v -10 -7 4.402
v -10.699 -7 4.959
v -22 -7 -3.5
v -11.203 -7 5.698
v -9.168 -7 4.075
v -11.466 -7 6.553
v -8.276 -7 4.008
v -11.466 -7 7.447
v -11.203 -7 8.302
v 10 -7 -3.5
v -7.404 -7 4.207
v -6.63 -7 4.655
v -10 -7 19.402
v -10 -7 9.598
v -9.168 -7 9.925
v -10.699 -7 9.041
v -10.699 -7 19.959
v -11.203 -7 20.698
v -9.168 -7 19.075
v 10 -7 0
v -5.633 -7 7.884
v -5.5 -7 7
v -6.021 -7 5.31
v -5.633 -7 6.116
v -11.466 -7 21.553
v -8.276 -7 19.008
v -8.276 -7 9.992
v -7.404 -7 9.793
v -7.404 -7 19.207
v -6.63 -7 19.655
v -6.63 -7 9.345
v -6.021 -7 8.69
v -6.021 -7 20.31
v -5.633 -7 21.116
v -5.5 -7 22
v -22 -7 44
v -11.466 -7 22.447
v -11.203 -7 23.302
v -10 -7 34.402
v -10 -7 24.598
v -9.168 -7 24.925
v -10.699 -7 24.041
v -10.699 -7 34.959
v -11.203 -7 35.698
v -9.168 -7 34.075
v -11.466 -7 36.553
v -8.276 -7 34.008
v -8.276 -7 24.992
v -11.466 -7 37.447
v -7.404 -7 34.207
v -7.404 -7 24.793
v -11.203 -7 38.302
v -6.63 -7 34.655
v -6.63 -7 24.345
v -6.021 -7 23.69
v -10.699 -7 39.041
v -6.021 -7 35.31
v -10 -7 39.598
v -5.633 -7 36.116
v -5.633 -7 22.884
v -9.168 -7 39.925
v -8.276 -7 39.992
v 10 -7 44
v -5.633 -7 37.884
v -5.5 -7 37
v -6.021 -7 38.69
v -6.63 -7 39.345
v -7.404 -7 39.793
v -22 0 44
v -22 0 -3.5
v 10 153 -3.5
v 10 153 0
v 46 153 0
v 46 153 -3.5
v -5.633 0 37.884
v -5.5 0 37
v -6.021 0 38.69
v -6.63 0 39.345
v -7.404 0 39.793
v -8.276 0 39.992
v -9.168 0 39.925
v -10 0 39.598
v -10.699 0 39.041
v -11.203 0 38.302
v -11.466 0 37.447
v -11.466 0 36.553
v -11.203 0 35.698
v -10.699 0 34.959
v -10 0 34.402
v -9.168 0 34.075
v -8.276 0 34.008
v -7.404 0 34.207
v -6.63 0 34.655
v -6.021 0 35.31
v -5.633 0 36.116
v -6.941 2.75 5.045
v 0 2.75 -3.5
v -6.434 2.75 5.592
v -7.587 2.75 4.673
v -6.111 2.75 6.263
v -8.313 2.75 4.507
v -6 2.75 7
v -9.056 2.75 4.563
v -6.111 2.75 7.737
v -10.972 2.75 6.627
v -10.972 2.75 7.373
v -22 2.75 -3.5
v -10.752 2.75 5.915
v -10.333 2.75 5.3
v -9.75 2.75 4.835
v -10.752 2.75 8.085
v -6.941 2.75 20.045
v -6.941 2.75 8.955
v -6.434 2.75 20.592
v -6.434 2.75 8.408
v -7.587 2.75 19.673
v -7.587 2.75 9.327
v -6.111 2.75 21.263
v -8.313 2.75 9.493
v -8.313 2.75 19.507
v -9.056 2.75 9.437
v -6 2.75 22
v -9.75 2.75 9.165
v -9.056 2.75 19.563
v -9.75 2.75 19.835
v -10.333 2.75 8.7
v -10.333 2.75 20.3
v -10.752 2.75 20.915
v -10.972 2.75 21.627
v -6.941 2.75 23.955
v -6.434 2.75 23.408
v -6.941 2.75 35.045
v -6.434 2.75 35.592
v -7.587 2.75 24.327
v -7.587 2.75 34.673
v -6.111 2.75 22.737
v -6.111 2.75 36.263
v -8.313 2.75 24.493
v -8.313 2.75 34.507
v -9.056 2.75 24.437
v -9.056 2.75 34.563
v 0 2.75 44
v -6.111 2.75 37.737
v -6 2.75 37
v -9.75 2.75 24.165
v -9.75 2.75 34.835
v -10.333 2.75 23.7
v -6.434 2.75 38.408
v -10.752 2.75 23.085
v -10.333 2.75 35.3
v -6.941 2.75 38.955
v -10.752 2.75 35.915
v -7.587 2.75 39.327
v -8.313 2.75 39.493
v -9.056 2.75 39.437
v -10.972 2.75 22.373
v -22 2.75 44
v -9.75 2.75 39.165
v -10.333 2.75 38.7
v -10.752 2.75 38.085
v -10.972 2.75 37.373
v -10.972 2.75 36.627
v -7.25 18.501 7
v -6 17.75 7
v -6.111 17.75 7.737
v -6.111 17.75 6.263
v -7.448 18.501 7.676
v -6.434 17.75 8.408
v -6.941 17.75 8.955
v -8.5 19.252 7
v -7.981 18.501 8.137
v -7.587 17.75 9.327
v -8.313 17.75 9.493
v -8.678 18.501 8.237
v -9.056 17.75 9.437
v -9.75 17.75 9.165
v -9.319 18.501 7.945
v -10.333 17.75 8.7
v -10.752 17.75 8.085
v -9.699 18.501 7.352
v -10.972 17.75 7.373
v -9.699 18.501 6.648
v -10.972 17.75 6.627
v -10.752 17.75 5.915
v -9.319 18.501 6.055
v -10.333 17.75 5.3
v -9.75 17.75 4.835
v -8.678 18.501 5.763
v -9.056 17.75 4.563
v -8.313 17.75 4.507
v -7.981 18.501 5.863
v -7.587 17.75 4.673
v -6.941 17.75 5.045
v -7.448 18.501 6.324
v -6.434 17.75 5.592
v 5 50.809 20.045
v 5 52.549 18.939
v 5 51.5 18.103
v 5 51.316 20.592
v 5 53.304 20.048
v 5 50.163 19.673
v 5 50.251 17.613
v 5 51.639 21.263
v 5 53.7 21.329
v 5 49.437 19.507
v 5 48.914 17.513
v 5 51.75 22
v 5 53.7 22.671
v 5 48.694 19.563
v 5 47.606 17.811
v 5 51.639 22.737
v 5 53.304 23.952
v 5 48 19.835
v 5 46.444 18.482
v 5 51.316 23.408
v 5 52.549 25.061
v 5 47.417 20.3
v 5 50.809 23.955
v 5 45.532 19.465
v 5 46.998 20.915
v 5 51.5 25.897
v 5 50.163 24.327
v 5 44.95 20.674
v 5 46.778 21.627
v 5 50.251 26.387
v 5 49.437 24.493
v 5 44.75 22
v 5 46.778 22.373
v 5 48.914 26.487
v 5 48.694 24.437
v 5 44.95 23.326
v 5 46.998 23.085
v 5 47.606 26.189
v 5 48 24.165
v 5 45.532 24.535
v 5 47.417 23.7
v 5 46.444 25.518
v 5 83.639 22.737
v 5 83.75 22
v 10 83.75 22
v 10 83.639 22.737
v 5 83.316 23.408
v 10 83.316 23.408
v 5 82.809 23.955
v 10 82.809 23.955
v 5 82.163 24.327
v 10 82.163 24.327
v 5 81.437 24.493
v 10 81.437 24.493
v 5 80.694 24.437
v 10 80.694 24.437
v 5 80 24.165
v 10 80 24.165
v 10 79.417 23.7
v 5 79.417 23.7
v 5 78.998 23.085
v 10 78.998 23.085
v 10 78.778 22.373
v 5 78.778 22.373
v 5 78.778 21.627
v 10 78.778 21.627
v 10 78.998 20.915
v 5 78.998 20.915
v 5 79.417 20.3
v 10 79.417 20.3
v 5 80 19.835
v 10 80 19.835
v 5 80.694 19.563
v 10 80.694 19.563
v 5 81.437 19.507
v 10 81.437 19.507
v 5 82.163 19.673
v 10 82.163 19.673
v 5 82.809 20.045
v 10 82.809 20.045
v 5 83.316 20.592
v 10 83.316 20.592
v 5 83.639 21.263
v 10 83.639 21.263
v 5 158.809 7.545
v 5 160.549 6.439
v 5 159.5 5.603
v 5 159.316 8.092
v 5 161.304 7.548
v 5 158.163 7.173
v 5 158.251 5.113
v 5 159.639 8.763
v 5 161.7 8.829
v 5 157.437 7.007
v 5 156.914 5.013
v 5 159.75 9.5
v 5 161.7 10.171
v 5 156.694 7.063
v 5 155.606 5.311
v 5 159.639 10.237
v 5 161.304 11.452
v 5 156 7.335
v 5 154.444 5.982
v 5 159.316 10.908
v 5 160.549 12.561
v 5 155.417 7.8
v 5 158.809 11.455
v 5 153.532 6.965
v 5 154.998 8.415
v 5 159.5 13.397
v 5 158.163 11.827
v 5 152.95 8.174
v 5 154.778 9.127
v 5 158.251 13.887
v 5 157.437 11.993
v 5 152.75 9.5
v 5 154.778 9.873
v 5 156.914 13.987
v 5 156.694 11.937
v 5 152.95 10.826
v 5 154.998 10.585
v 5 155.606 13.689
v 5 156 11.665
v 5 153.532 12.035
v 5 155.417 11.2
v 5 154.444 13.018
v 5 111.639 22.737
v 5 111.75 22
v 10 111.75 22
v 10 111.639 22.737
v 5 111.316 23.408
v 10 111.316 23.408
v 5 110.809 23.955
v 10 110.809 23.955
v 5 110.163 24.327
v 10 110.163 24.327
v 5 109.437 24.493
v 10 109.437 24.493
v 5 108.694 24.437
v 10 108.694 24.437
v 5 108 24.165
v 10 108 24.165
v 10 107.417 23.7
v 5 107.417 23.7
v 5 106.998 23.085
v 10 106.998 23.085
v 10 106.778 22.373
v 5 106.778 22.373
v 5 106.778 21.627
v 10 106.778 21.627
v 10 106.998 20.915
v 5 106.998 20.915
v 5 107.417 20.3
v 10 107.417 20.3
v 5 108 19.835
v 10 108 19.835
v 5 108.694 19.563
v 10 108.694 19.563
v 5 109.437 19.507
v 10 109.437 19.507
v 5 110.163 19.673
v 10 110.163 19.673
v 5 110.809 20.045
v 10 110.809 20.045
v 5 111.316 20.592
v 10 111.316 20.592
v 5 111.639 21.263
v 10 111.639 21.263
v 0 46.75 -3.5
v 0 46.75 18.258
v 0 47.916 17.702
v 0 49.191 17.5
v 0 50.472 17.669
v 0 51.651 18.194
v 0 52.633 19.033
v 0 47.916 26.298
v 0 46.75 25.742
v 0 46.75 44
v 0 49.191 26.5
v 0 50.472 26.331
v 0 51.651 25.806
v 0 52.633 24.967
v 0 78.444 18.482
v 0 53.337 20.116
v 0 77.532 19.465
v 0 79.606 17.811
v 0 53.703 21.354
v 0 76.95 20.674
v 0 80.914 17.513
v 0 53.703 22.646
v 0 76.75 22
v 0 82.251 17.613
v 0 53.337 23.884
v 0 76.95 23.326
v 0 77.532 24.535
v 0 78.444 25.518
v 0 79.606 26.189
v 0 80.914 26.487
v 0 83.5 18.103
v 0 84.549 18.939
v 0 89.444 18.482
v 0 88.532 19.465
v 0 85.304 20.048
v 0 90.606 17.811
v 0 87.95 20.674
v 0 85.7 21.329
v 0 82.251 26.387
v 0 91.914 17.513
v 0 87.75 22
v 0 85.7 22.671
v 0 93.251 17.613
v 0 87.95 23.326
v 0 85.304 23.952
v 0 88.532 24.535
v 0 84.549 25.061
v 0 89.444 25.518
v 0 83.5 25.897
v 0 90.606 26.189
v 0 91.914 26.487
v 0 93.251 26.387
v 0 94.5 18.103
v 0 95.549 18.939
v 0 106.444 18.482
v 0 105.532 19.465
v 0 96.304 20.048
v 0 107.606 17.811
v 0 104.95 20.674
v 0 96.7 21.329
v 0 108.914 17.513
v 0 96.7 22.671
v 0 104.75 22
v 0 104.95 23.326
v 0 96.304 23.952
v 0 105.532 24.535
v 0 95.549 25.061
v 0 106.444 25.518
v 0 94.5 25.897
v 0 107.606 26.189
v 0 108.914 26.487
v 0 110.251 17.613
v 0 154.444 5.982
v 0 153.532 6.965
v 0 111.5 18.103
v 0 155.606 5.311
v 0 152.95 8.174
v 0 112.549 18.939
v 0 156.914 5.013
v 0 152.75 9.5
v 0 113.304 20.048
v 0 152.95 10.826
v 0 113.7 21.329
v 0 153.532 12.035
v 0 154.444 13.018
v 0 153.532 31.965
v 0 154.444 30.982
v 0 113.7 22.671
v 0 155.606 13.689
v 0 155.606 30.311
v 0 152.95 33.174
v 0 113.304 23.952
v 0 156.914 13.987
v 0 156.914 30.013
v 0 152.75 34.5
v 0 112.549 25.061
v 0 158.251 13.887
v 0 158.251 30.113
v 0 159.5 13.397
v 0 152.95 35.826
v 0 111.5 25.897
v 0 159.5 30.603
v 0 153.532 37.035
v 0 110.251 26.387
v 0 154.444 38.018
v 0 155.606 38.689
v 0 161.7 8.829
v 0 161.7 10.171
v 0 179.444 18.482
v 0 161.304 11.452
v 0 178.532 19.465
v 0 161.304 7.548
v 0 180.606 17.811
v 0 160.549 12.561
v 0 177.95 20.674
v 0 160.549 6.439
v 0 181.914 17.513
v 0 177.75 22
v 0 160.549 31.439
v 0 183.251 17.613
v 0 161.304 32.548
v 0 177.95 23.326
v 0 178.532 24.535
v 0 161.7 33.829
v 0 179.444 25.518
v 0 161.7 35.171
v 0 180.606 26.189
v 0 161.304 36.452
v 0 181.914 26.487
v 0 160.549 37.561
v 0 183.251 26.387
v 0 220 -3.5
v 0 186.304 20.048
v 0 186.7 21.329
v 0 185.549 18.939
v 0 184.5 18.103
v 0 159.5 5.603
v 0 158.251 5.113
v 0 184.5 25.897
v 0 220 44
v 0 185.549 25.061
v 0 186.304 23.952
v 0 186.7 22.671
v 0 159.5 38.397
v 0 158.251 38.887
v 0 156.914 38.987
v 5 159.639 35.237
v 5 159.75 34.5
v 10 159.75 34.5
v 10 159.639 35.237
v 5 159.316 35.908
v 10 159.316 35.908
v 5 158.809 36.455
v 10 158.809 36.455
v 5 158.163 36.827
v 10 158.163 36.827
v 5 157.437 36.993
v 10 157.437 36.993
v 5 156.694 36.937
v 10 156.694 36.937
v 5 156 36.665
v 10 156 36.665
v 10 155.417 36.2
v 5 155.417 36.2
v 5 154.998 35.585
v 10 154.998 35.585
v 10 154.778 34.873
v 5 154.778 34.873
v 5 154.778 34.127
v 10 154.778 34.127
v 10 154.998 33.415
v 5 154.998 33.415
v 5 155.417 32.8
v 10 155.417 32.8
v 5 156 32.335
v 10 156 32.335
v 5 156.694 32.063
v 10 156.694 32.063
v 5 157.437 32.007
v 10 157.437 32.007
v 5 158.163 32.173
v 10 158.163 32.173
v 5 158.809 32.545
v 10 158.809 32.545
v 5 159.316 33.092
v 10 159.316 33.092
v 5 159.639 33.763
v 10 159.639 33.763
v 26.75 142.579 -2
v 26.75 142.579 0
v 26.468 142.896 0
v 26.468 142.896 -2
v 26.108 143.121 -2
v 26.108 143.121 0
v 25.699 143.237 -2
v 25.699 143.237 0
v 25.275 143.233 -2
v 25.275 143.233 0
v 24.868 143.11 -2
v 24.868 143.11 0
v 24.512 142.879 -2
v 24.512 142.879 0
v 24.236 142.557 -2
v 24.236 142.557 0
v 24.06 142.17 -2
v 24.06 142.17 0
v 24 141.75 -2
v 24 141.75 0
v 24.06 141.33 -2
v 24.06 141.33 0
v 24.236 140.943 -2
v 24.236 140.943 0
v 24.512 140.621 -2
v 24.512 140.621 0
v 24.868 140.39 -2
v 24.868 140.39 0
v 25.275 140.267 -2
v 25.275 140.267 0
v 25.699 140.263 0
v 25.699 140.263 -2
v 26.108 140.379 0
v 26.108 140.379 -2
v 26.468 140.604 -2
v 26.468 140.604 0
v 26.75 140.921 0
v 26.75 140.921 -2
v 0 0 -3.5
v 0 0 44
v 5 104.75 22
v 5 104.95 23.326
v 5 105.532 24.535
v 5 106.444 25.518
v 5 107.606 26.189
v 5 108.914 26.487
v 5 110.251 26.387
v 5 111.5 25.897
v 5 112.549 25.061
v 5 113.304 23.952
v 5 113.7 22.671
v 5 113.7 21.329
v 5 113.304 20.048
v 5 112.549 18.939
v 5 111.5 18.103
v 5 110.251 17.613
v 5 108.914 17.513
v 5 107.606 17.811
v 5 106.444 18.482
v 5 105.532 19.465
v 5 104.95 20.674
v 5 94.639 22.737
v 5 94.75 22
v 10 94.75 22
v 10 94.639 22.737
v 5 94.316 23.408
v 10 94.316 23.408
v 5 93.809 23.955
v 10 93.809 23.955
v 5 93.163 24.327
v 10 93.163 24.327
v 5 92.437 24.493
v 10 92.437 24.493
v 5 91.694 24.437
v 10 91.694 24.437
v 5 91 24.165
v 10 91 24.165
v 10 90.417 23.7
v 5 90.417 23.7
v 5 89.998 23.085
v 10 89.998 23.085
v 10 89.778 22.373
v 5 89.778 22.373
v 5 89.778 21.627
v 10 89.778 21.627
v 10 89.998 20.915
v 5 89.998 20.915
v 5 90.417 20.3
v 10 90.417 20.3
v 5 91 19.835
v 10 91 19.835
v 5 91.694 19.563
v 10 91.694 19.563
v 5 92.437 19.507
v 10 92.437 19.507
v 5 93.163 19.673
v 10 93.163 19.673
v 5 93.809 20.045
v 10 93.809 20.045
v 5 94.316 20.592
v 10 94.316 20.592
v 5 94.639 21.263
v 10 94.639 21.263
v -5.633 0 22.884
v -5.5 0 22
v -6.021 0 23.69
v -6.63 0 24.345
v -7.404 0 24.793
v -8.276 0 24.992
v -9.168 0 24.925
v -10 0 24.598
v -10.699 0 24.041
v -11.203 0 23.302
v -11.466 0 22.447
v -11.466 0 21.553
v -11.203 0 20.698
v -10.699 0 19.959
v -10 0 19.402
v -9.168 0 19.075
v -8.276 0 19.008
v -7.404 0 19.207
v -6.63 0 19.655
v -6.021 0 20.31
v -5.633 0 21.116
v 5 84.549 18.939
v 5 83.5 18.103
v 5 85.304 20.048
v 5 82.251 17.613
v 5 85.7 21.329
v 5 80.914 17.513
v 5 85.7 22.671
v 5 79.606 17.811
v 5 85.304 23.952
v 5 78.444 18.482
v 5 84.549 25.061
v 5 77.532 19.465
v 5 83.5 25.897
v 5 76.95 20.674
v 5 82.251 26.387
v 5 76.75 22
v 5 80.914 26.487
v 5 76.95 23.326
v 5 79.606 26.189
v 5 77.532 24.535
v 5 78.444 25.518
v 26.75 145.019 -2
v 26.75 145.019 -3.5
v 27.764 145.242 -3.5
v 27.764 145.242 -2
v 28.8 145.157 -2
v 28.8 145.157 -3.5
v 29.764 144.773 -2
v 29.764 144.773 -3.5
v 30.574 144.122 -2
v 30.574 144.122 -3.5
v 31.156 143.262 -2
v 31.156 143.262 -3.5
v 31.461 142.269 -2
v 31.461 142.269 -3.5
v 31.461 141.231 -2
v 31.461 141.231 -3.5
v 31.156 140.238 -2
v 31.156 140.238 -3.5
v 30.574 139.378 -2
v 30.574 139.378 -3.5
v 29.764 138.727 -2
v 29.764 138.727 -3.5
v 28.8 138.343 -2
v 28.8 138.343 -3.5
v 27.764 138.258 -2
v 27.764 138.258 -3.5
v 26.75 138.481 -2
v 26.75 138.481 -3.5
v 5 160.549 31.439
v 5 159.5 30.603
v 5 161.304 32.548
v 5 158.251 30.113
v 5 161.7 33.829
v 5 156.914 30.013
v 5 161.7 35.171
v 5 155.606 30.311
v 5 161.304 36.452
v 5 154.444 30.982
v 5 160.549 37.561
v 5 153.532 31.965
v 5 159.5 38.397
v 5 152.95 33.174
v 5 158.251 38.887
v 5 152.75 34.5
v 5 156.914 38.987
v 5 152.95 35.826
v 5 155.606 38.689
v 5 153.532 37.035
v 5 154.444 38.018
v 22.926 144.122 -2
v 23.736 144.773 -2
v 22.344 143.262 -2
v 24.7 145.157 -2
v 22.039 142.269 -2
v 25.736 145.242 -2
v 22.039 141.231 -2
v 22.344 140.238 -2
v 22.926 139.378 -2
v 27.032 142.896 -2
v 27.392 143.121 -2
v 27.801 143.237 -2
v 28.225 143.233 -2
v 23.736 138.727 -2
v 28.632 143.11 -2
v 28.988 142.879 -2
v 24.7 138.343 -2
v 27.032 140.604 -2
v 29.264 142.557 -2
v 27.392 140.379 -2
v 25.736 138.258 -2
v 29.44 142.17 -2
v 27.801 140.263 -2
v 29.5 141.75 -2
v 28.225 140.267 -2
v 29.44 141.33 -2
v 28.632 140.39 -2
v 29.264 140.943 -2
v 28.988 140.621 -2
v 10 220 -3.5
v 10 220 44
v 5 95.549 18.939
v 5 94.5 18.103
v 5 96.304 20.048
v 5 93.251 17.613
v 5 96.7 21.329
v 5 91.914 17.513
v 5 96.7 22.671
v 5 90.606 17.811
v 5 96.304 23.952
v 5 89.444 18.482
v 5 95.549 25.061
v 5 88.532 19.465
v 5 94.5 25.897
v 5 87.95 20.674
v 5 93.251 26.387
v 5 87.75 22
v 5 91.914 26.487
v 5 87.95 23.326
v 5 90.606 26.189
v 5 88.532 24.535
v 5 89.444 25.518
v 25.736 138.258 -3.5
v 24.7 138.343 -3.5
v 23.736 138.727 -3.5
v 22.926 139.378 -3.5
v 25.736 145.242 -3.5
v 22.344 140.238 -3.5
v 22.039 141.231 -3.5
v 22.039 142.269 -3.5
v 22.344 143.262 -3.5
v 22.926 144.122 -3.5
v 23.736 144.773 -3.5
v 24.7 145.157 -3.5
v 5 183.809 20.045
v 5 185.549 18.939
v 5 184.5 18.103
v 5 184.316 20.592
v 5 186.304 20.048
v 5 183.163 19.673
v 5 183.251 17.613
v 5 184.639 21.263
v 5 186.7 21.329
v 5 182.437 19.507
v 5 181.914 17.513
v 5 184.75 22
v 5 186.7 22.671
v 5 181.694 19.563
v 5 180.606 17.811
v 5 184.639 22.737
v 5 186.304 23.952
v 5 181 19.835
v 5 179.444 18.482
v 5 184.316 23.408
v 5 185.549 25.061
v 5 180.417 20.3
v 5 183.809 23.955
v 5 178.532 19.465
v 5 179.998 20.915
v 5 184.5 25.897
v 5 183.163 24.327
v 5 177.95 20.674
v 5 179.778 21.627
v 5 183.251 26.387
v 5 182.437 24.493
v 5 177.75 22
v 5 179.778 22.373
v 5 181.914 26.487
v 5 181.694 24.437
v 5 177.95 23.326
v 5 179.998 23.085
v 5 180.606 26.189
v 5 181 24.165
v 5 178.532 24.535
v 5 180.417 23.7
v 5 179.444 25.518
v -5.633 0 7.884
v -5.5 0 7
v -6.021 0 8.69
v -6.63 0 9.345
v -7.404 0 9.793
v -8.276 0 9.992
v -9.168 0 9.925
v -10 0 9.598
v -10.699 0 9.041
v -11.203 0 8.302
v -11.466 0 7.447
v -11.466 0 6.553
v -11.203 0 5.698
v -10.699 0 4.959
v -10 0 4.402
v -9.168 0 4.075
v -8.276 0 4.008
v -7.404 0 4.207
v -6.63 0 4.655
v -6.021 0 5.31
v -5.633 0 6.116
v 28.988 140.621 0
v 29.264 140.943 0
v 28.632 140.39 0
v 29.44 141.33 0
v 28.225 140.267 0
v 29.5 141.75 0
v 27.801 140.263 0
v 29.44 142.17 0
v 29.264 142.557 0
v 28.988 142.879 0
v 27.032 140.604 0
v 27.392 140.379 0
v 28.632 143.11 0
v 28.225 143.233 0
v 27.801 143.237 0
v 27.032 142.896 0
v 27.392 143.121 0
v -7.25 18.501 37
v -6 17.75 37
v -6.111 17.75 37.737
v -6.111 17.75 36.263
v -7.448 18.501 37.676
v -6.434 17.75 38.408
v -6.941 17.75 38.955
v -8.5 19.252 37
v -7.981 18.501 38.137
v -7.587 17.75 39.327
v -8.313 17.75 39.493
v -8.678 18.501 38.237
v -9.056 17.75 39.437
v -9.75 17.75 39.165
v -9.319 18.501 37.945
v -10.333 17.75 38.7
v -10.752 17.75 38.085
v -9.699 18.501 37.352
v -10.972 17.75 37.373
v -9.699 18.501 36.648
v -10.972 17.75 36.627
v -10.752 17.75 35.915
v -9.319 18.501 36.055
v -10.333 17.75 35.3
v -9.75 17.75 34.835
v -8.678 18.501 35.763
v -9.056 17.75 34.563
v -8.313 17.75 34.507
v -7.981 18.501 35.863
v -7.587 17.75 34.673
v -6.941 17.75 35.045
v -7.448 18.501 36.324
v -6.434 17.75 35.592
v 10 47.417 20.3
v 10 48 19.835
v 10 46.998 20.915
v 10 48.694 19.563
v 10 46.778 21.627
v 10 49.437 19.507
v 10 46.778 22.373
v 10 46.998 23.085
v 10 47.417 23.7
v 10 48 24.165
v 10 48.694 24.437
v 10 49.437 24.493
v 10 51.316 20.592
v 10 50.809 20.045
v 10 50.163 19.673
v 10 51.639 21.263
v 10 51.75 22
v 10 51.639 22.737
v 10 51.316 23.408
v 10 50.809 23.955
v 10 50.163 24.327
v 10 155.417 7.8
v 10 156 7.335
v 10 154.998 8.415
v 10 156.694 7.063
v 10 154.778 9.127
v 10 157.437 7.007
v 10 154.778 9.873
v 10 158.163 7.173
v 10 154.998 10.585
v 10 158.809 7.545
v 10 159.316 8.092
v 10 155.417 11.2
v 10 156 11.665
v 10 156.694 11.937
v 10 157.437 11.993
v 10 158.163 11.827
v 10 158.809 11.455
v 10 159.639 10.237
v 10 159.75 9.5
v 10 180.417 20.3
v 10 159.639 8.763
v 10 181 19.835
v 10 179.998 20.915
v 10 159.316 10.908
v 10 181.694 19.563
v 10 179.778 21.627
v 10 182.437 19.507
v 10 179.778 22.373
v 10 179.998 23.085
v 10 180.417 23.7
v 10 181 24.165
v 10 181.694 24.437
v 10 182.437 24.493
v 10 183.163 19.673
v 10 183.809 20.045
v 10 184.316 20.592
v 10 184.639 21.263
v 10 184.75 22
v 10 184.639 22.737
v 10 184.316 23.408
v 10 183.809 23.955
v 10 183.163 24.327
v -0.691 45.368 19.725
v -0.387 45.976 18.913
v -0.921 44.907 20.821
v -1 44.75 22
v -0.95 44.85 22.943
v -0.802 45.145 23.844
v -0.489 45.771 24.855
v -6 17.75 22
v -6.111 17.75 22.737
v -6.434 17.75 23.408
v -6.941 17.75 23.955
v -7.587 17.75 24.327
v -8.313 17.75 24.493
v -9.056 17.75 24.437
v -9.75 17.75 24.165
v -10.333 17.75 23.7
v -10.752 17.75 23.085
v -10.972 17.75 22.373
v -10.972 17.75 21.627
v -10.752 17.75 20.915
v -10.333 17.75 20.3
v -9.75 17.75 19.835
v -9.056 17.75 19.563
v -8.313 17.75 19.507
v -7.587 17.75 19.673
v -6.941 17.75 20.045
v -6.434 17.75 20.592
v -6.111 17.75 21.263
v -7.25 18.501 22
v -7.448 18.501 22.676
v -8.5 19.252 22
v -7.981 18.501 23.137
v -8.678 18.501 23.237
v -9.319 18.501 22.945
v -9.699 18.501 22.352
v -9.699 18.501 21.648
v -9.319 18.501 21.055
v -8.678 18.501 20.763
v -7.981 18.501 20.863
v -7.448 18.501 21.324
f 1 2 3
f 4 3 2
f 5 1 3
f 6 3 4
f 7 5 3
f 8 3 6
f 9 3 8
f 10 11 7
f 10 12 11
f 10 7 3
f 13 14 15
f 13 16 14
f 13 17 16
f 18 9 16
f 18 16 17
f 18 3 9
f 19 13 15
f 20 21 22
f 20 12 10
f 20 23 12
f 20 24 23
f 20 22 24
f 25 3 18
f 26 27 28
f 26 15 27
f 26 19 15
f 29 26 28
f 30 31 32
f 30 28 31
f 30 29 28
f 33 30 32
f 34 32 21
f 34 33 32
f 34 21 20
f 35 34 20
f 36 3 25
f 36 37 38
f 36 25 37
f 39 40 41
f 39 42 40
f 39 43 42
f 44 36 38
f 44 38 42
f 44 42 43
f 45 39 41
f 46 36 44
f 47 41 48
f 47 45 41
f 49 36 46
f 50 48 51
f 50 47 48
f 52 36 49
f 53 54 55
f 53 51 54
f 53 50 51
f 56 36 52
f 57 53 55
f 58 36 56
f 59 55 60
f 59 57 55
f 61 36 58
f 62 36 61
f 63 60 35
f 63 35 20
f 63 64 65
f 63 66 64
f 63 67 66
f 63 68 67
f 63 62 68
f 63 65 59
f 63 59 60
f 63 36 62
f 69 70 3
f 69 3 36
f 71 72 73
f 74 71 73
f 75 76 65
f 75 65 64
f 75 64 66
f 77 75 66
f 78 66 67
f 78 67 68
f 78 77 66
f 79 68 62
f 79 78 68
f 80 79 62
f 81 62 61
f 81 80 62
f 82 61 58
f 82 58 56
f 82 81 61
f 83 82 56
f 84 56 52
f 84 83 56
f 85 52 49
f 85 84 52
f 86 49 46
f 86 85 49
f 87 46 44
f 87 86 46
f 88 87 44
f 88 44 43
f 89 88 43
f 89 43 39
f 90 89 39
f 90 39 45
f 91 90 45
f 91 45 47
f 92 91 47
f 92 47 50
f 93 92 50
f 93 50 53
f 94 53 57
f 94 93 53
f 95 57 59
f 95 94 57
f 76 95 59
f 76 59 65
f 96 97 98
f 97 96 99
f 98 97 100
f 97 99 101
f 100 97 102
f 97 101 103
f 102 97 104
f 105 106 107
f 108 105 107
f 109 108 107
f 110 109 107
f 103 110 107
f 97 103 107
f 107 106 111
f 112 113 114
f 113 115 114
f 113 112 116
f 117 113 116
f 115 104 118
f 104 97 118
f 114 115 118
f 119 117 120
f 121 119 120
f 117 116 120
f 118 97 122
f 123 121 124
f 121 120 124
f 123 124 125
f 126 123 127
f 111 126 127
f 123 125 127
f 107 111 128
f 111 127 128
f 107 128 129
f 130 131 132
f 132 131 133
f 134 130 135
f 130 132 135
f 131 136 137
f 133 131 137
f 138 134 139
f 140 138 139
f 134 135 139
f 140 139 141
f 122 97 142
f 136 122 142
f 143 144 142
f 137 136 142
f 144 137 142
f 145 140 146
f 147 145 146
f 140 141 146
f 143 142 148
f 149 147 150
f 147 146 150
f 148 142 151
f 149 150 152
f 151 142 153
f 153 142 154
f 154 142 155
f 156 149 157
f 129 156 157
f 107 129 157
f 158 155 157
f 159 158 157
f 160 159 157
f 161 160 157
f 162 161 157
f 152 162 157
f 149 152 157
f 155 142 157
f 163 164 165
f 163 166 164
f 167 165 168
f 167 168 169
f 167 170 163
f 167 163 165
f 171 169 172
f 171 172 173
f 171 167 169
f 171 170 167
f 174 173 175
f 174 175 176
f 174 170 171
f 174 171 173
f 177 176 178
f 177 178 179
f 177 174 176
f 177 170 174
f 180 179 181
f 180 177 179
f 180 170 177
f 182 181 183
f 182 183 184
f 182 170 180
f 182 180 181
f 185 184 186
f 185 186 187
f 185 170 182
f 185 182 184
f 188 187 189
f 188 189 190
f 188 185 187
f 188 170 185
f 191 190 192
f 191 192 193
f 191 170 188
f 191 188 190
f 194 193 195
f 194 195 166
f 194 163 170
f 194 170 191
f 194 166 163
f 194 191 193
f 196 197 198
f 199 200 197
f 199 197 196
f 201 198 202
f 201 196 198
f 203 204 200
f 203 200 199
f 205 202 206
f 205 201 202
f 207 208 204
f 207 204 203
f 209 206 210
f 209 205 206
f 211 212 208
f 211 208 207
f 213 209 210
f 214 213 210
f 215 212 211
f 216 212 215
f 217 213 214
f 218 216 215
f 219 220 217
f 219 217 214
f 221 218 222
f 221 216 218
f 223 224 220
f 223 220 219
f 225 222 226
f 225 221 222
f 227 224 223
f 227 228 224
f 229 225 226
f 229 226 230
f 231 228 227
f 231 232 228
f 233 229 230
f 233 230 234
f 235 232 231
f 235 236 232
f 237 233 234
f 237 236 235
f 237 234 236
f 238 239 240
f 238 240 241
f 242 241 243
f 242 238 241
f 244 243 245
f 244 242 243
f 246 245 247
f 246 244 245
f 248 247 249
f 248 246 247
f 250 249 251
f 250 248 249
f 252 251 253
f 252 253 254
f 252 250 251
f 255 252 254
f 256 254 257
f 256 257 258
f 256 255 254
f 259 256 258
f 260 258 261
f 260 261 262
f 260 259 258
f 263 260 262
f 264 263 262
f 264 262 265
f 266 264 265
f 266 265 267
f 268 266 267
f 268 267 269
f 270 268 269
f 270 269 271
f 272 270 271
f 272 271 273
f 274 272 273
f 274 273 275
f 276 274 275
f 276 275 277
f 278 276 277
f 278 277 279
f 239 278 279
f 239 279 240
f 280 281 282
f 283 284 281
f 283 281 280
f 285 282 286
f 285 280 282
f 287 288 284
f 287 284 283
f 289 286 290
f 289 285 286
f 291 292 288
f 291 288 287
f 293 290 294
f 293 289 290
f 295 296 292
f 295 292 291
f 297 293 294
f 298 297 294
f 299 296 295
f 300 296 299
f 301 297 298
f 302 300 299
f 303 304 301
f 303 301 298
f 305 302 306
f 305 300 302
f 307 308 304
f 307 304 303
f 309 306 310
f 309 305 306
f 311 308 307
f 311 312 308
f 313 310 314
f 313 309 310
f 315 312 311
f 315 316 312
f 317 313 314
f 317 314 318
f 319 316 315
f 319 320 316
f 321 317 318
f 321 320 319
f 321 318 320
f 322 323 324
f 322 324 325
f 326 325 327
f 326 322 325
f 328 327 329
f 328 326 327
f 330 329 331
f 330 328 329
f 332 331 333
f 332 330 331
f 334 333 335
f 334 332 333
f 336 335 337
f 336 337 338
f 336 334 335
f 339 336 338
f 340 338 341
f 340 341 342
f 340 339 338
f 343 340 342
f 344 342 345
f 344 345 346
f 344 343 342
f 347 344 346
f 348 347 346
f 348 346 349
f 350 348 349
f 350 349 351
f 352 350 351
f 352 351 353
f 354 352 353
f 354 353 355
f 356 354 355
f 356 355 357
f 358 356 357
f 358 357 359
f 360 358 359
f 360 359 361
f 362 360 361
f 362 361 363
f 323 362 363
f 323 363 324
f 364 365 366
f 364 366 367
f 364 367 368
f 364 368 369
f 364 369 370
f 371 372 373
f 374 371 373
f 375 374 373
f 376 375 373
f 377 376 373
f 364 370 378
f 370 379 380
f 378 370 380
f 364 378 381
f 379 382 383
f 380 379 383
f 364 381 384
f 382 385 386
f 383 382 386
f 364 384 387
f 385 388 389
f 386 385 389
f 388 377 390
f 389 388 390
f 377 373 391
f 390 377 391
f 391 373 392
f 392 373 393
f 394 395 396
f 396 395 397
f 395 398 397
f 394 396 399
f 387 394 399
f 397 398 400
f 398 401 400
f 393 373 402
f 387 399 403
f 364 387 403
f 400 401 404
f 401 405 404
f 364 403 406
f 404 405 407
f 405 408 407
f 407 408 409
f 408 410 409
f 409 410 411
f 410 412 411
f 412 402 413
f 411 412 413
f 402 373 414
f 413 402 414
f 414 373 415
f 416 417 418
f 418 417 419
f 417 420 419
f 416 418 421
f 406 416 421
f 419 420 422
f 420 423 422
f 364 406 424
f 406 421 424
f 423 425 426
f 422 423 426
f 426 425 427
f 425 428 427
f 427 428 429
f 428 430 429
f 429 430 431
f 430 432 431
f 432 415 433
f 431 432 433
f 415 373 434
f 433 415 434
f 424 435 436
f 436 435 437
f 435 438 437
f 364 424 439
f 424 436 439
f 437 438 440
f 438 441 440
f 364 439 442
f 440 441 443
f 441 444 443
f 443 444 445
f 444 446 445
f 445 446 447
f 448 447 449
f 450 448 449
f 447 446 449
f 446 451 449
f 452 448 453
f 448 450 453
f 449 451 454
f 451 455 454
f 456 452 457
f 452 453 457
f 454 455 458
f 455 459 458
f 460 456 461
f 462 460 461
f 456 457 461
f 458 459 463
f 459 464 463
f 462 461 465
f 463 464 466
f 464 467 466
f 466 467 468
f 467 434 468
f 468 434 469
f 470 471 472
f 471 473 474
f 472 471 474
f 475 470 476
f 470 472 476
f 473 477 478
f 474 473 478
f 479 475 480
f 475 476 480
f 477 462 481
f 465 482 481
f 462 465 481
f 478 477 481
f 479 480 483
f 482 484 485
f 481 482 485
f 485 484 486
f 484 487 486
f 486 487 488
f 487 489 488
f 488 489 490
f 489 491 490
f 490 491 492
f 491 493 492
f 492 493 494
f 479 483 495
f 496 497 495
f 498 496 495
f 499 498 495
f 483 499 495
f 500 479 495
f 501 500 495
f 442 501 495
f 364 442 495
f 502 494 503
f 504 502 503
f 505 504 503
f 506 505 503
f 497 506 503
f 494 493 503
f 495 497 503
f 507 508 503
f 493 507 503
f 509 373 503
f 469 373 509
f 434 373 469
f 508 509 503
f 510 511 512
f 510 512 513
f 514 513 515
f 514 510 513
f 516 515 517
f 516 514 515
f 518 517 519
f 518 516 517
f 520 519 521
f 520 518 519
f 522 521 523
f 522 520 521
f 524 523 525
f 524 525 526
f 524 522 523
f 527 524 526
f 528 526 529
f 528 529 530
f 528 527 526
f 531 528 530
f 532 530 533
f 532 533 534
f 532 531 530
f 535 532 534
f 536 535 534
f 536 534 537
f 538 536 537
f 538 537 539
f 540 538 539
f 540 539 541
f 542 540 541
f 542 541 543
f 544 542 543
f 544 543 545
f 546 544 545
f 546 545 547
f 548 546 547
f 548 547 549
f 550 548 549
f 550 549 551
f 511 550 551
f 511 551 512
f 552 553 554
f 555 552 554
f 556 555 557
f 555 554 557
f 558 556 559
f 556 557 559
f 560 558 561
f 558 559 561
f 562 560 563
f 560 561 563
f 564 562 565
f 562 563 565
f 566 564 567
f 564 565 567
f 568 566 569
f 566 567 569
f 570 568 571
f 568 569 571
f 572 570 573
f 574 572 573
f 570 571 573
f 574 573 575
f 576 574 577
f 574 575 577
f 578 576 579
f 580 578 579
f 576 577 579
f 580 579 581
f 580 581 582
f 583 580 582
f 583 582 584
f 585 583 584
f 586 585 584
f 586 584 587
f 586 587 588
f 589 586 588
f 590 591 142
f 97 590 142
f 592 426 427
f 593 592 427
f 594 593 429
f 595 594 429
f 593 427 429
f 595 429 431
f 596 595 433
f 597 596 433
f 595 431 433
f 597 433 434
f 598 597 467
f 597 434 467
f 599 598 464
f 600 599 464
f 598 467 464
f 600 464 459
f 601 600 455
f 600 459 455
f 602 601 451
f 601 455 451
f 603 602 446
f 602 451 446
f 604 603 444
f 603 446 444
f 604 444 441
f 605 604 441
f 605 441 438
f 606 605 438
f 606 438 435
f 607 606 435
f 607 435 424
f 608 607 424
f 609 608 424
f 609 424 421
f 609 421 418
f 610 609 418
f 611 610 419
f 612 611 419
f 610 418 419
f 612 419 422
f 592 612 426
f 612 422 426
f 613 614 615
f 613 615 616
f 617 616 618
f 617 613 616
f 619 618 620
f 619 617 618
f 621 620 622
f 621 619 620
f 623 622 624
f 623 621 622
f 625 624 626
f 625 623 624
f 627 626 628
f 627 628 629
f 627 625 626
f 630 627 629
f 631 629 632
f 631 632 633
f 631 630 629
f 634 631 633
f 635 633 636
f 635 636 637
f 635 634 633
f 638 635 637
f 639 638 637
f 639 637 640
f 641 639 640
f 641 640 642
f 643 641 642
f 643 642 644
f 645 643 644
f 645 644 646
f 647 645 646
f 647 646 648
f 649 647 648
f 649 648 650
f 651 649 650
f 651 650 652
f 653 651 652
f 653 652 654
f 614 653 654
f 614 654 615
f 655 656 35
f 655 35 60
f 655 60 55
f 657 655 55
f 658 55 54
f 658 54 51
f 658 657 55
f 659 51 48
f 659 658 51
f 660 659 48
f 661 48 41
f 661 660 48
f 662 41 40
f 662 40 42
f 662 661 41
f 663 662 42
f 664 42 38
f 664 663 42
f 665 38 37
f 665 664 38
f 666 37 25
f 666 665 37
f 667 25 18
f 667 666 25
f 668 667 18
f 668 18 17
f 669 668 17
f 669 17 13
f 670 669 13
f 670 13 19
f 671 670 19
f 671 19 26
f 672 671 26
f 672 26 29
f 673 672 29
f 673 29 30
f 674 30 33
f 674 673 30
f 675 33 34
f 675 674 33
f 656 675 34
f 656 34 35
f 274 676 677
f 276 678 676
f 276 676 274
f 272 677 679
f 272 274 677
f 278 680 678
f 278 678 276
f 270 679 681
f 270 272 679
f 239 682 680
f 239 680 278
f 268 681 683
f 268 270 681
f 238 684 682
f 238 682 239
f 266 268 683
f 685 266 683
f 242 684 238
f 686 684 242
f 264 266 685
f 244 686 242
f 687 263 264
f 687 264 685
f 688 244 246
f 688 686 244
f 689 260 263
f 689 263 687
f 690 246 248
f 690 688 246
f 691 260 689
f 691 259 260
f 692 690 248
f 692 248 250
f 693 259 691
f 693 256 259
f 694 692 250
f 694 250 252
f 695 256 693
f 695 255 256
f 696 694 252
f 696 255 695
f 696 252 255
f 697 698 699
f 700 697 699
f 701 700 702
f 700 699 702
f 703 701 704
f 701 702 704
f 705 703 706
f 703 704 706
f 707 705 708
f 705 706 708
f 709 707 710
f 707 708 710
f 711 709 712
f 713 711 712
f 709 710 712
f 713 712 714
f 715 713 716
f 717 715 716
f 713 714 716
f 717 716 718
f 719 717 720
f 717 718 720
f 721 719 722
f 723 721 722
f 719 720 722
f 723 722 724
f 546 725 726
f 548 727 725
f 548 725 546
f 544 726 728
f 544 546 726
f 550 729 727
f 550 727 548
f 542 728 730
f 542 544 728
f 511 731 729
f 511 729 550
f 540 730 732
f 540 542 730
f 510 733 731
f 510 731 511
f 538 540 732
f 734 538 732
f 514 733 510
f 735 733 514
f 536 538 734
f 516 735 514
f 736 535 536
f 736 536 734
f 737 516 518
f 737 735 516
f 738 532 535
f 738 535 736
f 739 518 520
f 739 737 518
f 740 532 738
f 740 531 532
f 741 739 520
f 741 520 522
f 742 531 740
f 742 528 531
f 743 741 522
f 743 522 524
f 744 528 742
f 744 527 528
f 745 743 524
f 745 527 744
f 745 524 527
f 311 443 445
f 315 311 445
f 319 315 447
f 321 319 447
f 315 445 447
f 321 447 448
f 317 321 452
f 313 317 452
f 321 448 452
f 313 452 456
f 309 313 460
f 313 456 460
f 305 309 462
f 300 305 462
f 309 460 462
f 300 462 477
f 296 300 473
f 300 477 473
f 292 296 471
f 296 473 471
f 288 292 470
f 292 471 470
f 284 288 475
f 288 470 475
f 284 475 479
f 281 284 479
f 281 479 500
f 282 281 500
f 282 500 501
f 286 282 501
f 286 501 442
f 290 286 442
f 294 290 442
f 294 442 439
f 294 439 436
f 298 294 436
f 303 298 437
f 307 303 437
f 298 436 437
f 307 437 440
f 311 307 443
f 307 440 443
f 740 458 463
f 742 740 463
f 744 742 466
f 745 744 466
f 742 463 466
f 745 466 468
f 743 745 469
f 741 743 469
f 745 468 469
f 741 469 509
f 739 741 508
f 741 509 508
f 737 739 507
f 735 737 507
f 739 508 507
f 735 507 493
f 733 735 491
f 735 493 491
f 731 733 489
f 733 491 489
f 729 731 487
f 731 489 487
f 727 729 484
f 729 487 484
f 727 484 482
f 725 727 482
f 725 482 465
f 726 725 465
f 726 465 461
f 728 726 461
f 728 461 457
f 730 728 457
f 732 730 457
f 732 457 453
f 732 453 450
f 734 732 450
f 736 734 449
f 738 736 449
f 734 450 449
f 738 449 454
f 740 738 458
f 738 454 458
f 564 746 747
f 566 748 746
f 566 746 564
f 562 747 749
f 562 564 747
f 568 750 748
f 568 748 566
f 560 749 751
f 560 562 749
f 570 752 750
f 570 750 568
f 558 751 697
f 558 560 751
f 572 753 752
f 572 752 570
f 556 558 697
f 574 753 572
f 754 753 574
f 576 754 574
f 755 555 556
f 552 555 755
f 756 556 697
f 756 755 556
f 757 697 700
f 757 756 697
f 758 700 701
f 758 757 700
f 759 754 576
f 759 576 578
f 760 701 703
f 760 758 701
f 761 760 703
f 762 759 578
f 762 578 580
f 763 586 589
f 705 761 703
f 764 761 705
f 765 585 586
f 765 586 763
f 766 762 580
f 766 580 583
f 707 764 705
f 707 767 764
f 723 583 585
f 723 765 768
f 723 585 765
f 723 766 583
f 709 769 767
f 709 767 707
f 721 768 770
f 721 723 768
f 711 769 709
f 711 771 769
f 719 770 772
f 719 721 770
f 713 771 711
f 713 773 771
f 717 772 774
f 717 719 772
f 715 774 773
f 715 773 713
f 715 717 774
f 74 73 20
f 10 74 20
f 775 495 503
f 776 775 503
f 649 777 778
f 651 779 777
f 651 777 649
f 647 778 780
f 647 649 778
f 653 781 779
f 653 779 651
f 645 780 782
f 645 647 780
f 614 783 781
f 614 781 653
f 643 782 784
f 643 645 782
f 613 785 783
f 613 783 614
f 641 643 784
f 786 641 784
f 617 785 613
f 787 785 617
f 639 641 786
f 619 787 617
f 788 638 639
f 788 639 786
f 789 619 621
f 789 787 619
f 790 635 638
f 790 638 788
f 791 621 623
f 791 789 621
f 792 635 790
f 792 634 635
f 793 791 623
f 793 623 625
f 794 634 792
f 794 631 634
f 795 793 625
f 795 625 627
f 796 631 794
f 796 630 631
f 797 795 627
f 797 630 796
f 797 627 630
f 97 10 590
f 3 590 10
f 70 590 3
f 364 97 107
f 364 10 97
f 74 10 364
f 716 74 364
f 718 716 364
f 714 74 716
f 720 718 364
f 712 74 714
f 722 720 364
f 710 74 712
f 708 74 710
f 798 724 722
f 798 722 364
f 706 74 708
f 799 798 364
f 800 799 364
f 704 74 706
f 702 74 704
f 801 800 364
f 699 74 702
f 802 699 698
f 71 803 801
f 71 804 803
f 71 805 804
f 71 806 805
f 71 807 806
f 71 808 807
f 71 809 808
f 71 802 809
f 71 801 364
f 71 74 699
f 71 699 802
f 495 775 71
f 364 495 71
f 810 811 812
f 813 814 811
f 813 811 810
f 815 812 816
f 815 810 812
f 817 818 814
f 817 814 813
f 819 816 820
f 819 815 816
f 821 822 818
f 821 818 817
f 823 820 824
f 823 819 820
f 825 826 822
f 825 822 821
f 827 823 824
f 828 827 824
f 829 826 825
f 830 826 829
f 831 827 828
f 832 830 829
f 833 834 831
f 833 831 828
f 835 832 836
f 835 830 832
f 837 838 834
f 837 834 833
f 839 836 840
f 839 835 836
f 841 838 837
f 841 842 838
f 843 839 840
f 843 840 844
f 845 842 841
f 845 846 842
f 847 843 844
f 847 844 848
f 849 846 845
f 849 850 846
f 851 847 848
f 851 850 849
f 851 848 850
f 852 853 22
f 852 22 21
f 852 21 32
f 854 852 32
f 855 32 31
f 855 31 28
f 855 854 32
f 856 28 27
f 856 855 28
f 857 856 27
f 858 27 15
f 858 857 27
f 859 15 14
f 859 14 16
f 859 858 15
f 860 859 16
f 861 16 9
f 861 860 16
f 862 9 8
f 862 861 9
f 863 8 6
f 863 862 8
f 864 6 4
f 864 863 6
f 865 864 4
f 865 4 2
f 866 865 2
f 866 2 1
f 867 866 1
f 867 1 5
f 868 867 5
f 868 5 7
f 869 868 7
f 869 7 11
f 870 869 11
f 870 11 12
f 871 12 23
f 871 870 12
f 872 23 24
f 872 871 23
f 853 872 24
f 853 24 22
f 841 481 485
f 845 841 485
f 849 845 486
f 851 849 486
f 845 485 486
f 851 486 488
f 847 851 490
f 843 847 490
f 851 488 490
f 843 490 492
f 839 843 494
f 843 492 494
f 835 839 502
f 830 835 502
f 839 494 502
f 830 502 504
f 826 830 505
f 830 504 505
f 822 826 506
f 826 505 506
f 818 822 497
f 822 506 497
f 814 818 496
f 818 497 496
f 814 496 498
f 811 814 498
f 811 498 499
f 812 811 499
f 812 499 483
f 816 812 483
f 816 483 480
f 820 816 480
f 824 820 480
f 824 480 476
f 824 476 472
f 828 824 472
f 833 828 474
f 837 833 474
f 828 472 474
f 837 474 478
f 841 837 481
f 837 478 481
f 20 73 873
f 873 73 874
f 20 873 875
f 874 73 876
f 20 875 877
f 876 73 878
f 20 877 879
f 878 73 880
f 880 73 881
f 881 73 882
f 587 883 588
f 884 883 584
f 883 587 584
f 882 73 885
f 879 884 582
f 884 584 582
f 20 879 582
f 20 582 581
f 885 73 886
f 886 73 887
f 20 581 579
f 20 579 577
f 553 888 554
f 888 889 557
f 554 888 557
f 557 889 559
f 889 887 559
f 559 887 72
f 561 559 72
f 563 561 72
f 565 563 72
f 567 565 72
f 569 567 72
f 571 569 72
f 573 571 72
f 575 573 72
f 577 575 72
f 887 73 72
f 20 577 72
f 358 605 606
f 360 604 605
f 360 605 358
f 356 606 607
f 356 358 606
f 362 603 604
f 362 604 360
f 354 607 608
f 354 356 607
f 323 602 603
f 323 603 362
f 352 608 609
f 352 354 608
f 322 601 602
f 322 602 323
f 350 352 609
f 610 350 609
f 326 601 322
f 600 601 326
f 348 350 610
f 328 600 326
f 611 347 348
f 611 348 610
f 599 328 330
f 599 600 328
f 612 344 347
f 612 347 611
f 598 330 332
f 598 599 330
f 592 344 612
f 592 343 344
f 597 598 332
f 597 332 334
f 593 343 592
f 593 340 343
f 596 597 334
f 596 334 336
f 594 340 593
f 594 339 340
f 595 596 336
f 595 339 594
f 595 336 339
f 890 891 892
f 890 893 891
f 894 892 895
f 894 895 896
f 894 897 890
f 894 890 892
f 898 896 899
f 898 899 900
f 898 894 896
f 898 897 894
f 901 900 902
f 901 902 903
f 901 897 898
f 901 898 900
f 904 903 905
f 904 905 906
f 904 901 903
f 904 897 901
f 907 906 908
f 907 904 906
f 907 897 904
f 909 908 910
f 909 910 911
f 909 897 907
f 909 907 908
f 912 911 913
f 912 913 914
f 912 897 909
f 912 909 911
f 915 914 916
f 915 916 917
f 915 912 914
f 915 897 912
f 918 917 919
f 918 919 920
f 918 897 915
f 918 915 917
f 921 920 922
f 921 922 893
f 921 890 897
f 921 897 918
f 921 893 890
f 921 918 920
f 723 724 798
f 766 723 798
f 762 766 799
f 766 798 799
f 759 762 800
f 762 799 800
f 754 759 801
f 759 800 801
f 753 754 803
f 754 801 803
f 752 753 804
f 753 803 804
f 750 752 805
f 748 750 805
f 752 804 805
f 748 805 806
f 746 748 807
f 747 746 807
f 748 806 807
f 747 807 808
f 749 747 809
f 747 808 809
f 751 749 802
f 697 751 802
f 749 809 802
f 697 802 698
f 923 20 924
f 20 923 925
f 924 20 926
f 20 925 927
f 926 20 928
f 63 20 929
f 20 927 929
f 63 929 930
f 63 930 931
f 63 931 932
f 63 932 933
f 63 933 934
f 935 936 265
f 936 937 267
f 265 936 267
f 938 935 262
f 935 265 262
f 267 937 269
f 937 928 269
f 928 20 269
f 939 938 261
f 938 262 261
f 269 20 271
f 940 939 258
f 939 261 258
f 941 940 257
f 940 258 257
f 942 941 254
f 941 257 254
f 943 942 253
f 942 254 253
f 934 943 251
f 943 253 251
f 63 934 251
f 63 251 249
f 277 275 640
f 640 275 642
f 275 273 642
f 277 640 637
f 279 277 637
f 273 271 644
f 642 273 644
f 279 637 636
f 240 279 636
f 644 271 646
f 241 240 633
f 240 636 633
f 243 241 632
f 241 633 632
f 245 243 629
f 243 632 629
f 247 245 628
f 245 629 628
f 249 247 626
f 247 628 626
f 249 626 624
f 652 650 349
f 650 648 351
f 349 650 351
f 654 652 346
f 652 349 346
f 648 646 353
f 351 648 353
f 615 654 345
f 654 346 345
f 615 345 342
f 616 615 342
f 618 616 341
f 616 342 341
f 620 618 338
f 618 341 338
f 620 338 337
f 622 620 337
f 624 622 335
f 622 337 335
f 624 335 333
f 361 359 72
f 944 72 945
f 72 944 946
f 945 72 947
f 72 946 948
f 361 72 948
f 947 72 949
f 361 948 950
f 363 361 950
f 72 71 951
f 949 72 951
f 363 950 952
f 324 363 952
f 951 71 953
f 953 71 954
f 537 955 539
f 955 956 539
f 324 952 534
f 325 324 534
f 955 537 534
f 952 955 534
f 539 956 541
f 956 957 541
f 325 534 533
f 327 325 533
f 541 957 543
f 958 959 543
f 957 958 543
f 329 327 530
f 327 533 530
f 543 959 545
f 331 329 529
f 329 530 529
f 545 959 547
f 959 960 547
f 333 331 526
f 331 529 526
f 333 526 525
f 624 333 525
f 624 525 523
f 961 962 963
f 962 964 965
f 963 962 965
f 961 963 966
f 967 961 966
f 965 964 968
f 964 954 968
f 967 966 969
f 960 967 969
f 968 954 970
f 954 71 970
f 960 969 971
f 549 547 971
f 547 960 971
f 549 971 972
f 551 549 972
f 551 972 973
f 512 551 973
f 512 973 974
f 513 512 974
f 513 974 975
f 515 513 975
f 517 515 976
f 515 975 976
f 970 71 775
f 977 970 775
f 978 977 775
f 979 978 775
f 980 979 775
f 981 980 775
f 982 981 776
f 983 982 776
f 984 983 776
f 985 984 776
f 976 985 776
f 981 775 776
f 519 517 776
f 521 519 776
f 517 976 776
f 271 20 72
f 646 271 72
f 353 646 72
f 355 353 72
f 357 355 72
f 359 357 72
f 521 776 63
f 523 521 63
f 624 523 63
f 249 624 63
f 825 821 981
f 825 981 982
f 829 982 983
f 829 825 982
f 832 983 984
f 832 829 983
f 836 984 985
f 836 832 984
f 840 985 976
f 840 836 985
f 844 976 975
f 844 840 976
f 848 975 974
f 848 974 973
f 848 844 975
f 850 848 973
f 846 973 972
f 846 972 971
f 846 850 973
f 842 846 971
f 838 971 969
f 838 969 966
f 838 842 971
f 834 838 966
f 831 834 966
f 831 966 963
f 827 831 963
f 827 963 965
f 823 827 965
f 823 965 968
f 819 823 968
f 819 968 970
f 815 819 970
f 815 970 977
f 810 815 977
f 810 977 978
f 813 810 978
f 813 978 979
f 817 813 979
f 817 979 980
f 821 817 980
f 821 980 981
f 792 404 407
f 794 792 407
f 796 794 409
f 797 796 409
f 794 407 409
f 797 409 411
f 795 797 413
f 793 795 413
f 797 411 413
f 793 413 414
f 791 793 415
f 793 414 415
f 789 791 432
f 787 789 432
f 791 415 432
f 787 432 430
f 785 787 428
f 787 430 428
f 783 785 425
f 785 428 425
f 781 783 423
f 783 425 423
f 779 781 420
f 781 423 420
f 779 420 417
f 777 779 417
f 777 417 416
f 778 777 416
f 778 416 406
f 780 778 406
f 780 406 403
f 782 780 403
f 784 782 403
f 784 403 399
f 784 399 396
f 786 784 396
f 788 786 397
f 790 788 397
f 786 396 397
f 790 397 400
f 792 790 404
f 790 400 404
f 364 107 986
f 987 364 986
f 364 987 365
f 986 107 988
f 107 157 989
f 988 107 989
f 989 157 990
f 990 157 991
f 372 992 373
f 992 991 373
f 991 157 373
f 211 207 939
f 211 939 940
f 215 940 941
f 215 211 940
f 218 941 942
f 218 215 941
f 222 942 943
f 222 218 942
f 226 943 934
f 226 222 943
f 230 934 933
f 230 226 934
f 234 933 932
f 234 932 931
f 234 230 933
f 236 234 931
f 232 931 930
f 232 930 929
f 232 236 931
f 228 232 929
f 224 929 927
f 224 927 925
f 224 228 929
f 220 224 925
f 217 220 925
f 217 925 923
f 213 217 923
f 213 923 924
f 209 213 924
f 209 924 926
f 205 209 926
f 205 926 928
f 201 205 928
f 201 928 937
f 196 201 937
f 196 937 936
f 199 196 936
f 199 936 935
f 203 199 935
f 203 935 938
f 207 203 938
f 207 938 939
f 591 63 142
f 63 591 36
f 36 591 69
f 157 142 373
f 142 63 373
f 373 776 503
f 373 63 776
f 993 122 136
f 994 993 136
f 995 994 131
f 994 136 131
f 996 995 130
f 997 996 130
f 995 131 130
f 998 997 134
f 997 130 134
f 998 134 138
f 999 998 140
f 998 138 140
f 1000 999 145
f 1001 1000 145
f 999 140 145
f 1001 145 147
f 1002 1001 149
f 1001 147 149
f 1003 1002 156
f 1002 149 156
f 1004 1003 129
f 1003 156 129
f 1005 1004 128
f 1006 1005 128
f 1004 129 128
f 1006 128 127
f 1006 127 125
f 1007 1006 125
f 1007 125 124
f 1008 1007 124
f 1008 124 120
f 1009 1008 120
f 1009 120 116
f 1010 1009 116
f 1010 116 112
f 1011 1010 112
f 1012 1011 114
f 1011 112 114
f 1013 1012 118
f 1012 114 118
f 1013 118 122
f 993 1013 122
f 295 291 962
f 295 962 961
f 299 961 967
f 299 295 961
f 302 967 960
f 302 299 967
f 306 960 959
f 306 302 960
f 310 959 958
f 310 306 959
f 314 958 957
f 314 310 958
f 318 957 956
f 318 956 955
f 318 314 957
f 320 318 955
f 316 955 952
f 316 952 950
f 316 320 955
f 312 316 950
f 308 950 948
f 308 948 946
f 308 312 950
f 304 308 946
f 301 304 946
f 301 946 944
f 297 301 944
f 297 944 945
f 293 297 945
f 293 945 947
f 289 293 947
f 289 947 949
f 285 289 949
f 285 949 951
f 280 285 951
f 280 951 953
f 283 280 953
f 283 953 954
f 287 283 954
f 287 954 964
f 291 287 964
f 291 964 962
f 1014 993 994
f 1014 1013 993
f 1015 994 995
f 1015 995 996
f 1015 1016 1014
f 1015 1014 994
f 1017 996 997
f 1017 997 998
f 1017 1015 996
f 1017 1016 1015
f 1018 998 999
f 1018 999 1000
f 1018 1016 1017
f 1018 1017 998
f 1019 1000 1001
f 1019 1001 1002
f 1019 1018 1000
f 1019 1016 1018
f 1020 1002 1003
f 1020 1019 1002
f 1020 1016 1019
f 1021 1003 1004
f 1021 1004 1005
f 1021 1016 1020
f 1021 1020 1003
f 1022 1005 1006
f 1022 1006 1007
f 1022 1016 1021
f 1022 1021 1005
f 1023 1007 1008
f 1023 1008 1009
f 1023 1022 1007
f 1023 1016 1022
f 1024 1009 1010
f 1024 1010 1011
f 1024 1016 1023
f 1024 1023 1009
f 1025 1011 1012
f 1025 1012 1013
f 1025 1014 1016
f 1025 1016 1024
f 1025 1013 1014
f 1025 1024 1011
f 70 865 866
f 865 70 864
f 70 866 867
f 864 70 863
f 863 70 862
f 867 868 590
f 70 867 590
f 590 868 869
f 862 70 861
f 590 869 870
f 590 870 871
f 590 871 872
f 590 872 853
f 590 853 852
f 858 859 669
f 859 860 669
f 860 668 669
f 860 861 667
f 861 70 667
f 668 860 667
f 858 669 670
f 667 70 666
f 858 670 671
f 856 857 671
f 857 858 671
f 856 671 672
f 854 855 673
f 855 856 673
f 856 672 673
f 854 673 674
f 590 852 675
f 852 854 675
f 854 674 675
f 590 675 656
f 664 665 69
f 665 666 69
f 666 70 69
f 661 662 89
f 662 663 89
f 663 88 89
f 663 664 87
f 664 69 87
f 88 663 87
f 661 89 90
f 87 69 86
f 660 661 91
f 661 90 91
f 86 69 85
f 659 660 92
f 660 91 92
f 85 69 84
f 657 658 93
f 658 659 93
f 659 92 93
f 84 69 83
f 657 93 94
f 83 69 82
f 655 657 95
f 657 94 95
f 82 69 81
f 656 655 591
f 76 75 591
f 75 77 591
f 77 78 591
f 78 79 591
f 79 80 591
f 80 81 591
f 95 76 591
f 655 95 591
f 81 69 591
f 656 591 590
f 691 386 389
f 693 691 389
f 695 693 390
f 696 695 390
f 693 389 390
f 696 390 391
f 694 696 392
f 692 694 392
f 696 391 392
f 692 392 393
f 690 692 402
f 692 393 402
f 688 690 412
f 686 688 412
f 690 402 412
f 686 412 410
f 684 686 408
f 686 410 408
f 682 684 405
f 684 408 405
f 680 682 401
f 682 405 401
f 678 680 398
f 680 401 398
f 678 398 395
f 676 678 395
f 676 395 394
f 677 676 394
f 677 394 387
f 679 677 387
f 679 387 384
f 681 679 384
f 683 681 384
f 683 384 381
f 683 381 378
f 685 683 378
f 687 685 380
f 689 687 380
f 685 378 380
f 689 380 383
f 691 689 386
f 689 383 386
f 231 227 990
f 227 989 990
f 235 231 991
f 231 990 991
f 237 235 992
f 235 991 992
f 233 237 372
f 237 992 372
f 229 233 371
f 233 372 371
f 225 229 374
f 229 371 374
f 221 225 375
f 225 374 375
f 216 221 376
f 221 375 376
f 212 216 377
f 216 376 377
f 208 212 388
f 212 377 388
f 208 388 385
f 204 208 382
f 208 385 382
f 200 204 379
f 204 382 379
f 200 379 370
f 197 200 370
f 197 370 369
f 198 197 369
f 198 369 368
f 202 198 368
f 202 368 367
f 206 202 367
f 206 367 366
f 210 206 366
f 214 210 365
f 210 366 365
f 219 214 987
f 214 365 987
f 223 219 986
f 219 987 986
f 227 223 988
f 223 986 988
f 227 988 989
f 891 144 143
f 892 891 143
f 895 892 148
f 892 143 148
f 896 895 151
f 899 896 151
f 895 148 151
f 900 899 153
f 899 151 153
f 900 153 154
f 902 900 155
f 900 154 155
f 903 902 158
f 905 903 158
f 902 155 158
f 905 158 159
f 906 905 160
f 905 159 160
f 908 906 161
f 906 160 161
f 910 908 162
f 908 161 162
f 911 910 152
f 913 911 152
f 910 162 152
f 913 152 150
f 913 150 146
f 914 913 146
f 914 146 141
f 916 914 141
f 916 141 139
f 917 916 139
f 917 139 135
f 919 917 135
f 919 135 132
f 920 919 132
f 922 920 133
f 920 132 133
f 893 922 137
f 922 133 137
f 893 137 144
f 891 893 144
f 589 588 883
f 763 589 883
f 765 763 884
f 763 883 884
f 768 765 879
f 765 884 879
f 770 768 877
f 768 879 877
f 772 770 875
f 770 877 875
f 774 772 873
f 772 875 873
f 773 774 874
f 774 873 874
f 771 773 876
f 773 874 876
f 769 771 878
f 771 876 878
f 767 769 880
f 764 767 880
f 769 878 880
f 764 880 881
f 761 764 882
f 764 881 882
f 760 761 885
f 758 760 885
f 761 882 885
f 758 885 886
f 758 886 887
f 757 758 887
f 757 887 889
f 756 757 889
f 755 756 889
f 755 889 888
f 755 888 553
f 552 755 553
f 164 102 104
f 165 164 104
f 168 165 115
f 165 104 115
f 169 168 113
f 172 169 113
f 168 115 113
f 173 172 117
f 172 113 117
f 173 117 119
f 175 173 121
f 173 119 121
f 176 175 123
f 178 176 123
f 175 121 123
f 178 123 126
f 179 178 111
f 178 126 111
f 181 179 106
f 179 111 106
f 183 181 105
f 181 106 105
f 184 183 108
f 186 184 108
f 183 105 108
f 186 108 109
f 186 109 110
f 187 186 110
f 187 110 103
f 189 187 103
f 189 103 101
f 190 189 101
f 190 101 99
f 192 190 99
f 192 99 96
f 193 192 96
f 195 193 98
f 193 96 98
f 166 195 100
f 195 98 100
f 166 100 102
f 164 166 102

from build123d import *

# Parameters (mm, degrees)
SKETCH011_W          = 220
SKETCH011_H          = 47.5
SKETCH011_R          = 2.5
PAD006_DEPTH         = 10
SKETCH012_W          = 32
SKETCH012_H          = 47.5
SKETCH012_R          = 3
PAD007_DEPTH         = 7
PAD009_DEPTH         = 44
PAD009_DEPTH_BACK    = 3.5
PAD008_DEPTH         = 3.5
SKETCH015_R          = 2.5
HOLE002_DEPTH        = 15
HOLE002_TIPS_R       = 2.5
SKETCH016_R          = 4.5
POCKET002_DEPTH      = 5
POCKET002_DEPTH_BACK = 100
POCKET003_DEPTH      = 1.5
POCKET003_DEPTH_BACK = 100


with BuildPart() as part:
    # Sketch011 → Pad006 (new body)
    with BuildSketch(Plane.YZ):
        with Locations((110, 20.25)):
            Rectangle(SKETCH011_W, SKETCH011_H)
        with Locations((49.25, 22)):
            Circle(SKETCH011_R, mode=Mode.SUBTRACT)
        with Locations((81.25, 22)):
            Circle(SKETCH011_R, mode=Mode.SUBTRACT)
        with Locations((92.25, 22)):
            Circle(SKETCH011_R, mode=Mode.SUBTRACT)
        with Locations((109.25, 22)):
            Circle(SKETCH011_R, mode=Mode.SUBTRACT)
        with Locations((157.25, 34.5)):
            Circle(SKETCH011_R, mode=Mode.SUBTRACT)
        with Locations((157.25, 9.5)):
            Circle(SKETCH011_R, mode=Mode.SUBTRACT)
        with Locations((182.25, 22)):
            Circle(SKETCH011_R, mode=Mode.SUBTRACT)
    extrude(amount=PAD006_DEPTH)

    # Sketch012 (on Face2 of Pad006) → Pad007 (join)
    with BuildSketch(Plane.XZ):
        with Locations((-6, 20.25)):
            Rectangle(SKETCH012_W, SKETCH012_H)
        with Locations((-8.5, 37)):
            Circle(SKETCH012_R, mode=Mode.SUBTRACT)
        with Locations((-8.5, 22)):
            Circle(SKETCH012_R, mode=Mode.SUBTRACT)
        with Locations((-8.5, 7)):
            Circle(SKETCH012_R, mode=Mode.SUBTRACT)
    extrude(amount=PAD007_DEPTH)

    # Sketch014 → Pad009 (join, two sides)
    with BuildSketch(Plane.XY) as pad009_sk:
        Polygon((0, 2.75), (-22, 2.75), (0, 46.75), align=None)
    extrude(amount=PAD009_DEPTH)
    extrude(pad009_sk.sketch, amount=-PAD009_DEPTH_BACK)

    # Sketch013 → Pad008 (join)
    with BuildSketch(Plane.XY):
        Polygon((10, -7), (10, 153), (46, 153), align=None)
        with BuildLine():
            ThreePointArc((26.75, 142.579156), (24, 141.75), (26.75, 140.920844))
            ThreePointArc((26.75, 140.920844), (29.5, 141.75), (26.75, 142.579156))
        make_face(mode=Mode.SUBTRACT)
    extrude(amount=-PAD008_DEPTH)

    # Sketch015 (on Face21 of Pad008) → Hole002 (cut)
    with BuildSketch(Plane.XZ.offset(-2.75)):
        with Locations((-8.5, 37)):
            Circle(SKETCH015_R)
        with Locations((-8.5, 22)):
            Circle(SKETCH015_R)
        with Locations((-8.5, 7)):
            Circle(SKETCH015_R)
    extrude(amount=-HOLE002_DEPTH, mode=Mode.SUBTRACT)

    # Hole002 tips → Hole002 tip 1 section 0
    with BuildSketch(Plane.XZ.offset(-17.75), mode=Mode.PRIVATE) as hole002_tip_1_s0:
        with Locations((-8.5, 37)):
            Circle(HOLE002_TIPS_R)
    loft([hole002_tip_1_s0.sketch, Vertex(-8.5, 19.252152, 37)], mode=Mode.SUBTRACT)

    # Hole002 tips → Hole002 tip 2 section 0
    with BuildSketch(Plane.XZ.offset(-17.75), mode=Mode.PRIVATE) as hole002_tip_2_s0:
        with Locations((-8.5, 22)):
            Circle(HOLE002_TIPS_R)
    loft([hole002_tip_2_s0.sketch, Vertex(-8.5, 19.252152, 22)], mode=Mode.SUBTRACT)

    # Hole002 tips → Hole002 tip 3 section 0
    with BuildSketch(Plane.XZ.offset(-17.75), mode=Mode.PRIVATE) as hole002_tip_3_s0:
        with Locations((-8.5, 7)):
            Circle(HOLE002_TIPS_R)
    loft([hole002_tip_3_s0.sketch, Vertex(-8.5, 19.252152, 7)], mode=Mode.SUBTRACT)

    # Sketch016 (on Face4 of Hole002) → Pocket002 (cut, two sides)
    with BuildSketch(Plane(origin=(0, 0, 0), x_dir=(0, -1, 0), z_dir=(-1, 0, 0))) as pocket002_sk:
        with Locations((-182.25, 22)):
            Circle(SKETCH016_R)
        with Locations((-157.25, 34.5)):
            Circle(SKETCH016_R)
        with Locations((-157.25, 9.5)):
            Circle(SKETCH016_R)
        with Locations((-109.25, 22)):
            Circle(SKETCH016_R)
        with Locations((-92.25, 22)):
            Circle(SKETCH016_R)
        with Locations((-81.25, 22)):
            Circle(SKETCH016_R)
        with Locations((-49.25, 22)):
            Circle(SKETCH016_R)
    extrude(amount=-POCKET002_DEPTH, mode=Mode.SUBTRACT)
    extrude(pocket002_sk.sketch, amount=POCKET002_DEPTH_BACK, mode=Mode.SUBTRACT)

    # Sketch017 (on Face8 of Pocket002) → Pocket003 (cut, two sides)
    with BuildSketch(Plane(origin=(0, 0, -3.5), x_dir=(1, 0, 0), z_dir=(0, 0, -1))) as pocket003_sk:
        with BuildLine():
            ThreePointArc((26.75, -138.480826), (22, -141.75), (26.75, -145.019174))
            ThreePointArc((26.75, -145.019174), (31.5, -141.75), (26.75, -138.480826))
        make_face()
    extrude(amount=-POCKET003_DEPTH, mode=Mode.SUBTRACT)
    extrude(pocket003_sk.sketch, amount=POCKET003_DEPTH_BACK, mode=Mode.SUBTRACT)


solid = part.part
